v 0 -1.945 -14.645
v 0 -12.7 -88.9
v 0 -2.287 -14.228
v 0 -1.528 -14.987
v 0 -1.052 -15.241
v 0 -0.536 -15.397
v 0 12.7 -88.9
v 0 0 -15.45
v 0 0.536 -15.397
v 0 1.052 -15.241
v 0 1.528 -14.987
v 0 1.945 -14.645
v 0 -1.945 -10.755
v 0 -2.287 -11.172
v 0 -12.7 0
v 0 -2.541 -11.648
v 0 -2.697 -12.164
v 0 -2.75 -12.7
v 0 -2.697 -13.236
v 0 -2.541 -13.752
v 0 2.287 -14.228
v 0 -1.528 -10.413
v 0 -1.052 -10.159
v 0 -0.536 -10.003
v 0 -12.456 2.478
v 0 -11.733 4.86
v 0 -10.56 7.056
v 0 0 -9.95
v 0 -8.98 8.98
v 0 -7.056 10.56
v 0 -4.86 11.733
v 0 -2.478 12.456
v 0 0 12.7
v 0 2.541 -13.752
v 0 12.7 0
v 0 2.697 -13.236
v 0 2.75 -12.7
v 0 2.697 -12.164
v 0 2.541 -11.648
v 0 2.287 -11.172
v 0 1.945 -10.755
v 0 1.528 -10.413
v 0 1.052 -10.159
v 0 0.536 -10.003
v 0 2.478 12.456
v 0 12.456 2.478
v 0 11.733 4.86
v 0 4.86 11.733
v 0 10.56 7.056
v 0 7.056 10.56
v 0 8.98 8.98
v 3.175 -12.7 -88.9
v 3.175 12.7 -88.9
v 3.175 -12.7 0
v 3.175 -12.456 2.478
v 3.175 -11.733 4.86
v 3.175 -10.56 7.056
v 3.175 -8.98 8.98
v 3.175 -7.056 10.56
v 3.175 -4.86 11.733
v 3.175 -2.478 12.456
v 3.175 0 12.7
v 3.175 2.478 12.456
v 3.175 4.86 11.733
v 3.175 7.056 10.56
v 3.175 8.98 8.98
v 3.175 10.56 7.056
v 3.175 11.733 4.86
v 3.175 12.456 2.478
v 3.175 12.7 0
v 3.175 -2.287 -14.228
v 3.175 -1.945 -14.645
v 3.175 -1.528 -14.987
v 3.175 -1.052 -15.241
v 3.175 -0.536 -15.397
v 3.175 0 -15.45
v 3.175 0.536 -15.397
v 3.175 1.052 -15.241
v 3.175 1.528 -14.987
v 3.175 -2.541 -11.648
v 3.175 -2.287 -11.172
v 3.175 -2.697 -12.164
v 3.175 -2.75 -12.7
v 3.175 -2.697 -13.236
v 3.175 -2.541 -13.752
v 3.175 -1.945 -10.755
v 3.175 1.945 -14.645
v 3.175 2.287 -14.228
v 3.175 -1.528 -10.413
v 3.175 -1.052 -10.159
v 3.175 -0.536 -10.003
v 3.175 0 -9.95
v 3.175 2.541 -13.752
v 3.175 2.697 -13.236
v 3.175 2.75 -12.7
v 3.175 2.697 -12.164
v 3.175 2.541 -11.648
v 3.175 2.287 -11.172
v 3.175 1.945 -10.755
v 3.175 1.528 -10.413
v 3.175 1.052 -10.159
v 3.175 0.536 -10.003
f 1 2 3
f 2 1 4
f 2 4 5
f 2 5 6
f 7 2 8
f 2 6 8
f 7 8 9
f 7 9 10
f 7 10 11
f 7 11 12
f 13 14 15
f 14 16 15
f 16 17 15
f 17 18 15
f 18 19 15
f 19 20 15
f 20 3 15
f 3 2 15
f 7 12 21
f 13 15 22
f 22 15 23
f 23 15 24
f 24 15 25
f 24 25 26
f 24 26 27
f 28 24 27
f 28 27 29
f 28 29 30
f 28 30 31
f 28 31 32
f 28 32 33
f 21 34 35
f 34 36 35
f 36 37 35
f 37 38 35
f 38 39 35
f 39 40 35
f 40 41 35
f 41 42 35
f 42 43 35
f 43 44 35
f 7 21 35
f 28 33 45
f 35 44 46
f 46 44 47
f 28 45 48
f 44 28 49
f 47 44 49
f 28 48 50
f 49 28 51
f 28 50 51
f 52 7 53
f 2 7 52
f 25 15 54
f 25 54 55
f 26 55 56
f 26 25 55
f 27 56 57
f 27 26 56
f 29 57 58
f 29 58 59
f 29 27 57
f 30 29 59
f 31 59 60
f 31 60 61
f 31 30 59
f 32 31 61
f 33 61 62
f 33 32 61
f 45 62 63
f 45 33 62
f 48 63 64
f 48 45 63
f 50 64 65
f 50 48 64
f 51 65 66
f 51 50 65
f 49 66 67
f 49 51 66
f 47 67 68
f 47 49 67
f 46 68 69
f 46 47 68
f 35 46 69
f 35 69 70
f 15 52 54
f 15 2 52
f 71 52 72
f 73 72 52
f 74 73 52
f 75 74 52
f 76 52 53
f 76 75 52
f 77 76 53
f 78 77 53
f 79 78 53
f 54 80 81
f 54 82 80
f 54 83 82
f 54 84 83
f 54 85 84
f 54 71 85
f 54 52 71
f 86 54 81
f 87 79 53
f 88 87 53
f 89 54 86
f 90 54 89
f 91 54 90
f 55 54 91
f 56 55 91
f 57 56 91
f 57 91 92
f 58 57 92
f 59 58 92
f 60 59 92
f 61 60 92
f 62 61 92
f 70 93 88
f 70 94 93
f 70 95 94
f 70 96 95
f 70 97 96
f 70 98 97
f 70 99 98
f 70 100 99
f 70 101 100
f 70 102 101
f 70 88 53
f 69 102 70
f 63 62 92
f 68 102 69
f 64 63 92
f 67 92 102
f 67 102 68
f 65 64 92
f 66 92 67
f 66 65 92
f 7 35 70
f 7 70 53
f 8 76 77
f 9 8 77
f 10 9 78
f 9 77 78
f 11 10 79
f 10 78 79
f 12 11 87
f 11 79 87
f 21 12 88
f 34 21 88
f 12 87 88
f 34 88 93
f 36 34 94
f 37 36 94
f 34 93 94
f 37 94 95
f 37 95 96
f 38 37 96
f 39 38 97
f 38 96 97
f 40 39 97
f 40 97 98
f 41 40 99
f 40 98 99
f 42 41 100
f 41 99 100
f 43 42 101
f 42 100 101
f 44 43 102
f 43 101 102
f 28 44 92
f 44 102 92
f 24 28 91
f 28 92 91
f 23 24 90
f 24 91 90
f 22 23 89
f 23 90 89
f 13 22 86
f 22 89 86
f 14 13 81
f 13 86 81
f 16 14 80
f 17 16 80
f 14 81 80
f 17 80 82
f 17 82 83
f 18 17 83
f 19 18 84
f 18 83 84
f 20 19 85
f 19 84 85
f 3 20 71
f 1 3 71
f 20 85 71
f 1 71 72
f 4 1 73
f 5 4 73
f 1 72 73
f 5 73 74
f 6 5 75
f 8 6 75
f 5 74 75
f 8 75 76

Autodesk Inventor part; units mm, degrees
ref_plane "YZ Plane" through (0, 0, 0) normal (1, 0, 0) x (0, 1, 0)
ref_plane "XZ Plane" through (0, 0, 0) normal (0, 1, 0) x (-1, 0, 0)
ref_plane "XY Plane" through (0, 0, 0) normal (0, 0, 1) x (1, 0, 0)
sketch "Sketch1" plane through (0, 0, 0) normal (1, 0, 0) x (0, 1, 0)
  circle A0 centre (0, 0) radius 12.7
  line L0 (0, 12.7) -> (0, -88.9)
  line L1 (12.7, 0) -> (12.7, -88.9)
  line L2 (12.7, -88.9) -> (0, -88.9)
  line L3 (-12.7, -88.9) -> (-12.7, 0)
  line L4 (0, -88.9) -> (-12.7, -88.9)
  dimension "d0" = 25.4
  dimension "d1" = 101.6
extrude "Extrusion1" add sketch "Sketch1" along normal blind 3.175
sketch "Sketch6" plane through (3.175, 0, 0) normal (1, 0, 0) x (0, 0, -1)
  circle A0 centre (12.7, 0) radius 2.75
  point P0 (0, 0)
  dimension "d8" = 5.5
extrude "Extrusion2" cut sketch "Sketch6" against normal through all
properties part number "thing4" material "Aluminum 6061"
